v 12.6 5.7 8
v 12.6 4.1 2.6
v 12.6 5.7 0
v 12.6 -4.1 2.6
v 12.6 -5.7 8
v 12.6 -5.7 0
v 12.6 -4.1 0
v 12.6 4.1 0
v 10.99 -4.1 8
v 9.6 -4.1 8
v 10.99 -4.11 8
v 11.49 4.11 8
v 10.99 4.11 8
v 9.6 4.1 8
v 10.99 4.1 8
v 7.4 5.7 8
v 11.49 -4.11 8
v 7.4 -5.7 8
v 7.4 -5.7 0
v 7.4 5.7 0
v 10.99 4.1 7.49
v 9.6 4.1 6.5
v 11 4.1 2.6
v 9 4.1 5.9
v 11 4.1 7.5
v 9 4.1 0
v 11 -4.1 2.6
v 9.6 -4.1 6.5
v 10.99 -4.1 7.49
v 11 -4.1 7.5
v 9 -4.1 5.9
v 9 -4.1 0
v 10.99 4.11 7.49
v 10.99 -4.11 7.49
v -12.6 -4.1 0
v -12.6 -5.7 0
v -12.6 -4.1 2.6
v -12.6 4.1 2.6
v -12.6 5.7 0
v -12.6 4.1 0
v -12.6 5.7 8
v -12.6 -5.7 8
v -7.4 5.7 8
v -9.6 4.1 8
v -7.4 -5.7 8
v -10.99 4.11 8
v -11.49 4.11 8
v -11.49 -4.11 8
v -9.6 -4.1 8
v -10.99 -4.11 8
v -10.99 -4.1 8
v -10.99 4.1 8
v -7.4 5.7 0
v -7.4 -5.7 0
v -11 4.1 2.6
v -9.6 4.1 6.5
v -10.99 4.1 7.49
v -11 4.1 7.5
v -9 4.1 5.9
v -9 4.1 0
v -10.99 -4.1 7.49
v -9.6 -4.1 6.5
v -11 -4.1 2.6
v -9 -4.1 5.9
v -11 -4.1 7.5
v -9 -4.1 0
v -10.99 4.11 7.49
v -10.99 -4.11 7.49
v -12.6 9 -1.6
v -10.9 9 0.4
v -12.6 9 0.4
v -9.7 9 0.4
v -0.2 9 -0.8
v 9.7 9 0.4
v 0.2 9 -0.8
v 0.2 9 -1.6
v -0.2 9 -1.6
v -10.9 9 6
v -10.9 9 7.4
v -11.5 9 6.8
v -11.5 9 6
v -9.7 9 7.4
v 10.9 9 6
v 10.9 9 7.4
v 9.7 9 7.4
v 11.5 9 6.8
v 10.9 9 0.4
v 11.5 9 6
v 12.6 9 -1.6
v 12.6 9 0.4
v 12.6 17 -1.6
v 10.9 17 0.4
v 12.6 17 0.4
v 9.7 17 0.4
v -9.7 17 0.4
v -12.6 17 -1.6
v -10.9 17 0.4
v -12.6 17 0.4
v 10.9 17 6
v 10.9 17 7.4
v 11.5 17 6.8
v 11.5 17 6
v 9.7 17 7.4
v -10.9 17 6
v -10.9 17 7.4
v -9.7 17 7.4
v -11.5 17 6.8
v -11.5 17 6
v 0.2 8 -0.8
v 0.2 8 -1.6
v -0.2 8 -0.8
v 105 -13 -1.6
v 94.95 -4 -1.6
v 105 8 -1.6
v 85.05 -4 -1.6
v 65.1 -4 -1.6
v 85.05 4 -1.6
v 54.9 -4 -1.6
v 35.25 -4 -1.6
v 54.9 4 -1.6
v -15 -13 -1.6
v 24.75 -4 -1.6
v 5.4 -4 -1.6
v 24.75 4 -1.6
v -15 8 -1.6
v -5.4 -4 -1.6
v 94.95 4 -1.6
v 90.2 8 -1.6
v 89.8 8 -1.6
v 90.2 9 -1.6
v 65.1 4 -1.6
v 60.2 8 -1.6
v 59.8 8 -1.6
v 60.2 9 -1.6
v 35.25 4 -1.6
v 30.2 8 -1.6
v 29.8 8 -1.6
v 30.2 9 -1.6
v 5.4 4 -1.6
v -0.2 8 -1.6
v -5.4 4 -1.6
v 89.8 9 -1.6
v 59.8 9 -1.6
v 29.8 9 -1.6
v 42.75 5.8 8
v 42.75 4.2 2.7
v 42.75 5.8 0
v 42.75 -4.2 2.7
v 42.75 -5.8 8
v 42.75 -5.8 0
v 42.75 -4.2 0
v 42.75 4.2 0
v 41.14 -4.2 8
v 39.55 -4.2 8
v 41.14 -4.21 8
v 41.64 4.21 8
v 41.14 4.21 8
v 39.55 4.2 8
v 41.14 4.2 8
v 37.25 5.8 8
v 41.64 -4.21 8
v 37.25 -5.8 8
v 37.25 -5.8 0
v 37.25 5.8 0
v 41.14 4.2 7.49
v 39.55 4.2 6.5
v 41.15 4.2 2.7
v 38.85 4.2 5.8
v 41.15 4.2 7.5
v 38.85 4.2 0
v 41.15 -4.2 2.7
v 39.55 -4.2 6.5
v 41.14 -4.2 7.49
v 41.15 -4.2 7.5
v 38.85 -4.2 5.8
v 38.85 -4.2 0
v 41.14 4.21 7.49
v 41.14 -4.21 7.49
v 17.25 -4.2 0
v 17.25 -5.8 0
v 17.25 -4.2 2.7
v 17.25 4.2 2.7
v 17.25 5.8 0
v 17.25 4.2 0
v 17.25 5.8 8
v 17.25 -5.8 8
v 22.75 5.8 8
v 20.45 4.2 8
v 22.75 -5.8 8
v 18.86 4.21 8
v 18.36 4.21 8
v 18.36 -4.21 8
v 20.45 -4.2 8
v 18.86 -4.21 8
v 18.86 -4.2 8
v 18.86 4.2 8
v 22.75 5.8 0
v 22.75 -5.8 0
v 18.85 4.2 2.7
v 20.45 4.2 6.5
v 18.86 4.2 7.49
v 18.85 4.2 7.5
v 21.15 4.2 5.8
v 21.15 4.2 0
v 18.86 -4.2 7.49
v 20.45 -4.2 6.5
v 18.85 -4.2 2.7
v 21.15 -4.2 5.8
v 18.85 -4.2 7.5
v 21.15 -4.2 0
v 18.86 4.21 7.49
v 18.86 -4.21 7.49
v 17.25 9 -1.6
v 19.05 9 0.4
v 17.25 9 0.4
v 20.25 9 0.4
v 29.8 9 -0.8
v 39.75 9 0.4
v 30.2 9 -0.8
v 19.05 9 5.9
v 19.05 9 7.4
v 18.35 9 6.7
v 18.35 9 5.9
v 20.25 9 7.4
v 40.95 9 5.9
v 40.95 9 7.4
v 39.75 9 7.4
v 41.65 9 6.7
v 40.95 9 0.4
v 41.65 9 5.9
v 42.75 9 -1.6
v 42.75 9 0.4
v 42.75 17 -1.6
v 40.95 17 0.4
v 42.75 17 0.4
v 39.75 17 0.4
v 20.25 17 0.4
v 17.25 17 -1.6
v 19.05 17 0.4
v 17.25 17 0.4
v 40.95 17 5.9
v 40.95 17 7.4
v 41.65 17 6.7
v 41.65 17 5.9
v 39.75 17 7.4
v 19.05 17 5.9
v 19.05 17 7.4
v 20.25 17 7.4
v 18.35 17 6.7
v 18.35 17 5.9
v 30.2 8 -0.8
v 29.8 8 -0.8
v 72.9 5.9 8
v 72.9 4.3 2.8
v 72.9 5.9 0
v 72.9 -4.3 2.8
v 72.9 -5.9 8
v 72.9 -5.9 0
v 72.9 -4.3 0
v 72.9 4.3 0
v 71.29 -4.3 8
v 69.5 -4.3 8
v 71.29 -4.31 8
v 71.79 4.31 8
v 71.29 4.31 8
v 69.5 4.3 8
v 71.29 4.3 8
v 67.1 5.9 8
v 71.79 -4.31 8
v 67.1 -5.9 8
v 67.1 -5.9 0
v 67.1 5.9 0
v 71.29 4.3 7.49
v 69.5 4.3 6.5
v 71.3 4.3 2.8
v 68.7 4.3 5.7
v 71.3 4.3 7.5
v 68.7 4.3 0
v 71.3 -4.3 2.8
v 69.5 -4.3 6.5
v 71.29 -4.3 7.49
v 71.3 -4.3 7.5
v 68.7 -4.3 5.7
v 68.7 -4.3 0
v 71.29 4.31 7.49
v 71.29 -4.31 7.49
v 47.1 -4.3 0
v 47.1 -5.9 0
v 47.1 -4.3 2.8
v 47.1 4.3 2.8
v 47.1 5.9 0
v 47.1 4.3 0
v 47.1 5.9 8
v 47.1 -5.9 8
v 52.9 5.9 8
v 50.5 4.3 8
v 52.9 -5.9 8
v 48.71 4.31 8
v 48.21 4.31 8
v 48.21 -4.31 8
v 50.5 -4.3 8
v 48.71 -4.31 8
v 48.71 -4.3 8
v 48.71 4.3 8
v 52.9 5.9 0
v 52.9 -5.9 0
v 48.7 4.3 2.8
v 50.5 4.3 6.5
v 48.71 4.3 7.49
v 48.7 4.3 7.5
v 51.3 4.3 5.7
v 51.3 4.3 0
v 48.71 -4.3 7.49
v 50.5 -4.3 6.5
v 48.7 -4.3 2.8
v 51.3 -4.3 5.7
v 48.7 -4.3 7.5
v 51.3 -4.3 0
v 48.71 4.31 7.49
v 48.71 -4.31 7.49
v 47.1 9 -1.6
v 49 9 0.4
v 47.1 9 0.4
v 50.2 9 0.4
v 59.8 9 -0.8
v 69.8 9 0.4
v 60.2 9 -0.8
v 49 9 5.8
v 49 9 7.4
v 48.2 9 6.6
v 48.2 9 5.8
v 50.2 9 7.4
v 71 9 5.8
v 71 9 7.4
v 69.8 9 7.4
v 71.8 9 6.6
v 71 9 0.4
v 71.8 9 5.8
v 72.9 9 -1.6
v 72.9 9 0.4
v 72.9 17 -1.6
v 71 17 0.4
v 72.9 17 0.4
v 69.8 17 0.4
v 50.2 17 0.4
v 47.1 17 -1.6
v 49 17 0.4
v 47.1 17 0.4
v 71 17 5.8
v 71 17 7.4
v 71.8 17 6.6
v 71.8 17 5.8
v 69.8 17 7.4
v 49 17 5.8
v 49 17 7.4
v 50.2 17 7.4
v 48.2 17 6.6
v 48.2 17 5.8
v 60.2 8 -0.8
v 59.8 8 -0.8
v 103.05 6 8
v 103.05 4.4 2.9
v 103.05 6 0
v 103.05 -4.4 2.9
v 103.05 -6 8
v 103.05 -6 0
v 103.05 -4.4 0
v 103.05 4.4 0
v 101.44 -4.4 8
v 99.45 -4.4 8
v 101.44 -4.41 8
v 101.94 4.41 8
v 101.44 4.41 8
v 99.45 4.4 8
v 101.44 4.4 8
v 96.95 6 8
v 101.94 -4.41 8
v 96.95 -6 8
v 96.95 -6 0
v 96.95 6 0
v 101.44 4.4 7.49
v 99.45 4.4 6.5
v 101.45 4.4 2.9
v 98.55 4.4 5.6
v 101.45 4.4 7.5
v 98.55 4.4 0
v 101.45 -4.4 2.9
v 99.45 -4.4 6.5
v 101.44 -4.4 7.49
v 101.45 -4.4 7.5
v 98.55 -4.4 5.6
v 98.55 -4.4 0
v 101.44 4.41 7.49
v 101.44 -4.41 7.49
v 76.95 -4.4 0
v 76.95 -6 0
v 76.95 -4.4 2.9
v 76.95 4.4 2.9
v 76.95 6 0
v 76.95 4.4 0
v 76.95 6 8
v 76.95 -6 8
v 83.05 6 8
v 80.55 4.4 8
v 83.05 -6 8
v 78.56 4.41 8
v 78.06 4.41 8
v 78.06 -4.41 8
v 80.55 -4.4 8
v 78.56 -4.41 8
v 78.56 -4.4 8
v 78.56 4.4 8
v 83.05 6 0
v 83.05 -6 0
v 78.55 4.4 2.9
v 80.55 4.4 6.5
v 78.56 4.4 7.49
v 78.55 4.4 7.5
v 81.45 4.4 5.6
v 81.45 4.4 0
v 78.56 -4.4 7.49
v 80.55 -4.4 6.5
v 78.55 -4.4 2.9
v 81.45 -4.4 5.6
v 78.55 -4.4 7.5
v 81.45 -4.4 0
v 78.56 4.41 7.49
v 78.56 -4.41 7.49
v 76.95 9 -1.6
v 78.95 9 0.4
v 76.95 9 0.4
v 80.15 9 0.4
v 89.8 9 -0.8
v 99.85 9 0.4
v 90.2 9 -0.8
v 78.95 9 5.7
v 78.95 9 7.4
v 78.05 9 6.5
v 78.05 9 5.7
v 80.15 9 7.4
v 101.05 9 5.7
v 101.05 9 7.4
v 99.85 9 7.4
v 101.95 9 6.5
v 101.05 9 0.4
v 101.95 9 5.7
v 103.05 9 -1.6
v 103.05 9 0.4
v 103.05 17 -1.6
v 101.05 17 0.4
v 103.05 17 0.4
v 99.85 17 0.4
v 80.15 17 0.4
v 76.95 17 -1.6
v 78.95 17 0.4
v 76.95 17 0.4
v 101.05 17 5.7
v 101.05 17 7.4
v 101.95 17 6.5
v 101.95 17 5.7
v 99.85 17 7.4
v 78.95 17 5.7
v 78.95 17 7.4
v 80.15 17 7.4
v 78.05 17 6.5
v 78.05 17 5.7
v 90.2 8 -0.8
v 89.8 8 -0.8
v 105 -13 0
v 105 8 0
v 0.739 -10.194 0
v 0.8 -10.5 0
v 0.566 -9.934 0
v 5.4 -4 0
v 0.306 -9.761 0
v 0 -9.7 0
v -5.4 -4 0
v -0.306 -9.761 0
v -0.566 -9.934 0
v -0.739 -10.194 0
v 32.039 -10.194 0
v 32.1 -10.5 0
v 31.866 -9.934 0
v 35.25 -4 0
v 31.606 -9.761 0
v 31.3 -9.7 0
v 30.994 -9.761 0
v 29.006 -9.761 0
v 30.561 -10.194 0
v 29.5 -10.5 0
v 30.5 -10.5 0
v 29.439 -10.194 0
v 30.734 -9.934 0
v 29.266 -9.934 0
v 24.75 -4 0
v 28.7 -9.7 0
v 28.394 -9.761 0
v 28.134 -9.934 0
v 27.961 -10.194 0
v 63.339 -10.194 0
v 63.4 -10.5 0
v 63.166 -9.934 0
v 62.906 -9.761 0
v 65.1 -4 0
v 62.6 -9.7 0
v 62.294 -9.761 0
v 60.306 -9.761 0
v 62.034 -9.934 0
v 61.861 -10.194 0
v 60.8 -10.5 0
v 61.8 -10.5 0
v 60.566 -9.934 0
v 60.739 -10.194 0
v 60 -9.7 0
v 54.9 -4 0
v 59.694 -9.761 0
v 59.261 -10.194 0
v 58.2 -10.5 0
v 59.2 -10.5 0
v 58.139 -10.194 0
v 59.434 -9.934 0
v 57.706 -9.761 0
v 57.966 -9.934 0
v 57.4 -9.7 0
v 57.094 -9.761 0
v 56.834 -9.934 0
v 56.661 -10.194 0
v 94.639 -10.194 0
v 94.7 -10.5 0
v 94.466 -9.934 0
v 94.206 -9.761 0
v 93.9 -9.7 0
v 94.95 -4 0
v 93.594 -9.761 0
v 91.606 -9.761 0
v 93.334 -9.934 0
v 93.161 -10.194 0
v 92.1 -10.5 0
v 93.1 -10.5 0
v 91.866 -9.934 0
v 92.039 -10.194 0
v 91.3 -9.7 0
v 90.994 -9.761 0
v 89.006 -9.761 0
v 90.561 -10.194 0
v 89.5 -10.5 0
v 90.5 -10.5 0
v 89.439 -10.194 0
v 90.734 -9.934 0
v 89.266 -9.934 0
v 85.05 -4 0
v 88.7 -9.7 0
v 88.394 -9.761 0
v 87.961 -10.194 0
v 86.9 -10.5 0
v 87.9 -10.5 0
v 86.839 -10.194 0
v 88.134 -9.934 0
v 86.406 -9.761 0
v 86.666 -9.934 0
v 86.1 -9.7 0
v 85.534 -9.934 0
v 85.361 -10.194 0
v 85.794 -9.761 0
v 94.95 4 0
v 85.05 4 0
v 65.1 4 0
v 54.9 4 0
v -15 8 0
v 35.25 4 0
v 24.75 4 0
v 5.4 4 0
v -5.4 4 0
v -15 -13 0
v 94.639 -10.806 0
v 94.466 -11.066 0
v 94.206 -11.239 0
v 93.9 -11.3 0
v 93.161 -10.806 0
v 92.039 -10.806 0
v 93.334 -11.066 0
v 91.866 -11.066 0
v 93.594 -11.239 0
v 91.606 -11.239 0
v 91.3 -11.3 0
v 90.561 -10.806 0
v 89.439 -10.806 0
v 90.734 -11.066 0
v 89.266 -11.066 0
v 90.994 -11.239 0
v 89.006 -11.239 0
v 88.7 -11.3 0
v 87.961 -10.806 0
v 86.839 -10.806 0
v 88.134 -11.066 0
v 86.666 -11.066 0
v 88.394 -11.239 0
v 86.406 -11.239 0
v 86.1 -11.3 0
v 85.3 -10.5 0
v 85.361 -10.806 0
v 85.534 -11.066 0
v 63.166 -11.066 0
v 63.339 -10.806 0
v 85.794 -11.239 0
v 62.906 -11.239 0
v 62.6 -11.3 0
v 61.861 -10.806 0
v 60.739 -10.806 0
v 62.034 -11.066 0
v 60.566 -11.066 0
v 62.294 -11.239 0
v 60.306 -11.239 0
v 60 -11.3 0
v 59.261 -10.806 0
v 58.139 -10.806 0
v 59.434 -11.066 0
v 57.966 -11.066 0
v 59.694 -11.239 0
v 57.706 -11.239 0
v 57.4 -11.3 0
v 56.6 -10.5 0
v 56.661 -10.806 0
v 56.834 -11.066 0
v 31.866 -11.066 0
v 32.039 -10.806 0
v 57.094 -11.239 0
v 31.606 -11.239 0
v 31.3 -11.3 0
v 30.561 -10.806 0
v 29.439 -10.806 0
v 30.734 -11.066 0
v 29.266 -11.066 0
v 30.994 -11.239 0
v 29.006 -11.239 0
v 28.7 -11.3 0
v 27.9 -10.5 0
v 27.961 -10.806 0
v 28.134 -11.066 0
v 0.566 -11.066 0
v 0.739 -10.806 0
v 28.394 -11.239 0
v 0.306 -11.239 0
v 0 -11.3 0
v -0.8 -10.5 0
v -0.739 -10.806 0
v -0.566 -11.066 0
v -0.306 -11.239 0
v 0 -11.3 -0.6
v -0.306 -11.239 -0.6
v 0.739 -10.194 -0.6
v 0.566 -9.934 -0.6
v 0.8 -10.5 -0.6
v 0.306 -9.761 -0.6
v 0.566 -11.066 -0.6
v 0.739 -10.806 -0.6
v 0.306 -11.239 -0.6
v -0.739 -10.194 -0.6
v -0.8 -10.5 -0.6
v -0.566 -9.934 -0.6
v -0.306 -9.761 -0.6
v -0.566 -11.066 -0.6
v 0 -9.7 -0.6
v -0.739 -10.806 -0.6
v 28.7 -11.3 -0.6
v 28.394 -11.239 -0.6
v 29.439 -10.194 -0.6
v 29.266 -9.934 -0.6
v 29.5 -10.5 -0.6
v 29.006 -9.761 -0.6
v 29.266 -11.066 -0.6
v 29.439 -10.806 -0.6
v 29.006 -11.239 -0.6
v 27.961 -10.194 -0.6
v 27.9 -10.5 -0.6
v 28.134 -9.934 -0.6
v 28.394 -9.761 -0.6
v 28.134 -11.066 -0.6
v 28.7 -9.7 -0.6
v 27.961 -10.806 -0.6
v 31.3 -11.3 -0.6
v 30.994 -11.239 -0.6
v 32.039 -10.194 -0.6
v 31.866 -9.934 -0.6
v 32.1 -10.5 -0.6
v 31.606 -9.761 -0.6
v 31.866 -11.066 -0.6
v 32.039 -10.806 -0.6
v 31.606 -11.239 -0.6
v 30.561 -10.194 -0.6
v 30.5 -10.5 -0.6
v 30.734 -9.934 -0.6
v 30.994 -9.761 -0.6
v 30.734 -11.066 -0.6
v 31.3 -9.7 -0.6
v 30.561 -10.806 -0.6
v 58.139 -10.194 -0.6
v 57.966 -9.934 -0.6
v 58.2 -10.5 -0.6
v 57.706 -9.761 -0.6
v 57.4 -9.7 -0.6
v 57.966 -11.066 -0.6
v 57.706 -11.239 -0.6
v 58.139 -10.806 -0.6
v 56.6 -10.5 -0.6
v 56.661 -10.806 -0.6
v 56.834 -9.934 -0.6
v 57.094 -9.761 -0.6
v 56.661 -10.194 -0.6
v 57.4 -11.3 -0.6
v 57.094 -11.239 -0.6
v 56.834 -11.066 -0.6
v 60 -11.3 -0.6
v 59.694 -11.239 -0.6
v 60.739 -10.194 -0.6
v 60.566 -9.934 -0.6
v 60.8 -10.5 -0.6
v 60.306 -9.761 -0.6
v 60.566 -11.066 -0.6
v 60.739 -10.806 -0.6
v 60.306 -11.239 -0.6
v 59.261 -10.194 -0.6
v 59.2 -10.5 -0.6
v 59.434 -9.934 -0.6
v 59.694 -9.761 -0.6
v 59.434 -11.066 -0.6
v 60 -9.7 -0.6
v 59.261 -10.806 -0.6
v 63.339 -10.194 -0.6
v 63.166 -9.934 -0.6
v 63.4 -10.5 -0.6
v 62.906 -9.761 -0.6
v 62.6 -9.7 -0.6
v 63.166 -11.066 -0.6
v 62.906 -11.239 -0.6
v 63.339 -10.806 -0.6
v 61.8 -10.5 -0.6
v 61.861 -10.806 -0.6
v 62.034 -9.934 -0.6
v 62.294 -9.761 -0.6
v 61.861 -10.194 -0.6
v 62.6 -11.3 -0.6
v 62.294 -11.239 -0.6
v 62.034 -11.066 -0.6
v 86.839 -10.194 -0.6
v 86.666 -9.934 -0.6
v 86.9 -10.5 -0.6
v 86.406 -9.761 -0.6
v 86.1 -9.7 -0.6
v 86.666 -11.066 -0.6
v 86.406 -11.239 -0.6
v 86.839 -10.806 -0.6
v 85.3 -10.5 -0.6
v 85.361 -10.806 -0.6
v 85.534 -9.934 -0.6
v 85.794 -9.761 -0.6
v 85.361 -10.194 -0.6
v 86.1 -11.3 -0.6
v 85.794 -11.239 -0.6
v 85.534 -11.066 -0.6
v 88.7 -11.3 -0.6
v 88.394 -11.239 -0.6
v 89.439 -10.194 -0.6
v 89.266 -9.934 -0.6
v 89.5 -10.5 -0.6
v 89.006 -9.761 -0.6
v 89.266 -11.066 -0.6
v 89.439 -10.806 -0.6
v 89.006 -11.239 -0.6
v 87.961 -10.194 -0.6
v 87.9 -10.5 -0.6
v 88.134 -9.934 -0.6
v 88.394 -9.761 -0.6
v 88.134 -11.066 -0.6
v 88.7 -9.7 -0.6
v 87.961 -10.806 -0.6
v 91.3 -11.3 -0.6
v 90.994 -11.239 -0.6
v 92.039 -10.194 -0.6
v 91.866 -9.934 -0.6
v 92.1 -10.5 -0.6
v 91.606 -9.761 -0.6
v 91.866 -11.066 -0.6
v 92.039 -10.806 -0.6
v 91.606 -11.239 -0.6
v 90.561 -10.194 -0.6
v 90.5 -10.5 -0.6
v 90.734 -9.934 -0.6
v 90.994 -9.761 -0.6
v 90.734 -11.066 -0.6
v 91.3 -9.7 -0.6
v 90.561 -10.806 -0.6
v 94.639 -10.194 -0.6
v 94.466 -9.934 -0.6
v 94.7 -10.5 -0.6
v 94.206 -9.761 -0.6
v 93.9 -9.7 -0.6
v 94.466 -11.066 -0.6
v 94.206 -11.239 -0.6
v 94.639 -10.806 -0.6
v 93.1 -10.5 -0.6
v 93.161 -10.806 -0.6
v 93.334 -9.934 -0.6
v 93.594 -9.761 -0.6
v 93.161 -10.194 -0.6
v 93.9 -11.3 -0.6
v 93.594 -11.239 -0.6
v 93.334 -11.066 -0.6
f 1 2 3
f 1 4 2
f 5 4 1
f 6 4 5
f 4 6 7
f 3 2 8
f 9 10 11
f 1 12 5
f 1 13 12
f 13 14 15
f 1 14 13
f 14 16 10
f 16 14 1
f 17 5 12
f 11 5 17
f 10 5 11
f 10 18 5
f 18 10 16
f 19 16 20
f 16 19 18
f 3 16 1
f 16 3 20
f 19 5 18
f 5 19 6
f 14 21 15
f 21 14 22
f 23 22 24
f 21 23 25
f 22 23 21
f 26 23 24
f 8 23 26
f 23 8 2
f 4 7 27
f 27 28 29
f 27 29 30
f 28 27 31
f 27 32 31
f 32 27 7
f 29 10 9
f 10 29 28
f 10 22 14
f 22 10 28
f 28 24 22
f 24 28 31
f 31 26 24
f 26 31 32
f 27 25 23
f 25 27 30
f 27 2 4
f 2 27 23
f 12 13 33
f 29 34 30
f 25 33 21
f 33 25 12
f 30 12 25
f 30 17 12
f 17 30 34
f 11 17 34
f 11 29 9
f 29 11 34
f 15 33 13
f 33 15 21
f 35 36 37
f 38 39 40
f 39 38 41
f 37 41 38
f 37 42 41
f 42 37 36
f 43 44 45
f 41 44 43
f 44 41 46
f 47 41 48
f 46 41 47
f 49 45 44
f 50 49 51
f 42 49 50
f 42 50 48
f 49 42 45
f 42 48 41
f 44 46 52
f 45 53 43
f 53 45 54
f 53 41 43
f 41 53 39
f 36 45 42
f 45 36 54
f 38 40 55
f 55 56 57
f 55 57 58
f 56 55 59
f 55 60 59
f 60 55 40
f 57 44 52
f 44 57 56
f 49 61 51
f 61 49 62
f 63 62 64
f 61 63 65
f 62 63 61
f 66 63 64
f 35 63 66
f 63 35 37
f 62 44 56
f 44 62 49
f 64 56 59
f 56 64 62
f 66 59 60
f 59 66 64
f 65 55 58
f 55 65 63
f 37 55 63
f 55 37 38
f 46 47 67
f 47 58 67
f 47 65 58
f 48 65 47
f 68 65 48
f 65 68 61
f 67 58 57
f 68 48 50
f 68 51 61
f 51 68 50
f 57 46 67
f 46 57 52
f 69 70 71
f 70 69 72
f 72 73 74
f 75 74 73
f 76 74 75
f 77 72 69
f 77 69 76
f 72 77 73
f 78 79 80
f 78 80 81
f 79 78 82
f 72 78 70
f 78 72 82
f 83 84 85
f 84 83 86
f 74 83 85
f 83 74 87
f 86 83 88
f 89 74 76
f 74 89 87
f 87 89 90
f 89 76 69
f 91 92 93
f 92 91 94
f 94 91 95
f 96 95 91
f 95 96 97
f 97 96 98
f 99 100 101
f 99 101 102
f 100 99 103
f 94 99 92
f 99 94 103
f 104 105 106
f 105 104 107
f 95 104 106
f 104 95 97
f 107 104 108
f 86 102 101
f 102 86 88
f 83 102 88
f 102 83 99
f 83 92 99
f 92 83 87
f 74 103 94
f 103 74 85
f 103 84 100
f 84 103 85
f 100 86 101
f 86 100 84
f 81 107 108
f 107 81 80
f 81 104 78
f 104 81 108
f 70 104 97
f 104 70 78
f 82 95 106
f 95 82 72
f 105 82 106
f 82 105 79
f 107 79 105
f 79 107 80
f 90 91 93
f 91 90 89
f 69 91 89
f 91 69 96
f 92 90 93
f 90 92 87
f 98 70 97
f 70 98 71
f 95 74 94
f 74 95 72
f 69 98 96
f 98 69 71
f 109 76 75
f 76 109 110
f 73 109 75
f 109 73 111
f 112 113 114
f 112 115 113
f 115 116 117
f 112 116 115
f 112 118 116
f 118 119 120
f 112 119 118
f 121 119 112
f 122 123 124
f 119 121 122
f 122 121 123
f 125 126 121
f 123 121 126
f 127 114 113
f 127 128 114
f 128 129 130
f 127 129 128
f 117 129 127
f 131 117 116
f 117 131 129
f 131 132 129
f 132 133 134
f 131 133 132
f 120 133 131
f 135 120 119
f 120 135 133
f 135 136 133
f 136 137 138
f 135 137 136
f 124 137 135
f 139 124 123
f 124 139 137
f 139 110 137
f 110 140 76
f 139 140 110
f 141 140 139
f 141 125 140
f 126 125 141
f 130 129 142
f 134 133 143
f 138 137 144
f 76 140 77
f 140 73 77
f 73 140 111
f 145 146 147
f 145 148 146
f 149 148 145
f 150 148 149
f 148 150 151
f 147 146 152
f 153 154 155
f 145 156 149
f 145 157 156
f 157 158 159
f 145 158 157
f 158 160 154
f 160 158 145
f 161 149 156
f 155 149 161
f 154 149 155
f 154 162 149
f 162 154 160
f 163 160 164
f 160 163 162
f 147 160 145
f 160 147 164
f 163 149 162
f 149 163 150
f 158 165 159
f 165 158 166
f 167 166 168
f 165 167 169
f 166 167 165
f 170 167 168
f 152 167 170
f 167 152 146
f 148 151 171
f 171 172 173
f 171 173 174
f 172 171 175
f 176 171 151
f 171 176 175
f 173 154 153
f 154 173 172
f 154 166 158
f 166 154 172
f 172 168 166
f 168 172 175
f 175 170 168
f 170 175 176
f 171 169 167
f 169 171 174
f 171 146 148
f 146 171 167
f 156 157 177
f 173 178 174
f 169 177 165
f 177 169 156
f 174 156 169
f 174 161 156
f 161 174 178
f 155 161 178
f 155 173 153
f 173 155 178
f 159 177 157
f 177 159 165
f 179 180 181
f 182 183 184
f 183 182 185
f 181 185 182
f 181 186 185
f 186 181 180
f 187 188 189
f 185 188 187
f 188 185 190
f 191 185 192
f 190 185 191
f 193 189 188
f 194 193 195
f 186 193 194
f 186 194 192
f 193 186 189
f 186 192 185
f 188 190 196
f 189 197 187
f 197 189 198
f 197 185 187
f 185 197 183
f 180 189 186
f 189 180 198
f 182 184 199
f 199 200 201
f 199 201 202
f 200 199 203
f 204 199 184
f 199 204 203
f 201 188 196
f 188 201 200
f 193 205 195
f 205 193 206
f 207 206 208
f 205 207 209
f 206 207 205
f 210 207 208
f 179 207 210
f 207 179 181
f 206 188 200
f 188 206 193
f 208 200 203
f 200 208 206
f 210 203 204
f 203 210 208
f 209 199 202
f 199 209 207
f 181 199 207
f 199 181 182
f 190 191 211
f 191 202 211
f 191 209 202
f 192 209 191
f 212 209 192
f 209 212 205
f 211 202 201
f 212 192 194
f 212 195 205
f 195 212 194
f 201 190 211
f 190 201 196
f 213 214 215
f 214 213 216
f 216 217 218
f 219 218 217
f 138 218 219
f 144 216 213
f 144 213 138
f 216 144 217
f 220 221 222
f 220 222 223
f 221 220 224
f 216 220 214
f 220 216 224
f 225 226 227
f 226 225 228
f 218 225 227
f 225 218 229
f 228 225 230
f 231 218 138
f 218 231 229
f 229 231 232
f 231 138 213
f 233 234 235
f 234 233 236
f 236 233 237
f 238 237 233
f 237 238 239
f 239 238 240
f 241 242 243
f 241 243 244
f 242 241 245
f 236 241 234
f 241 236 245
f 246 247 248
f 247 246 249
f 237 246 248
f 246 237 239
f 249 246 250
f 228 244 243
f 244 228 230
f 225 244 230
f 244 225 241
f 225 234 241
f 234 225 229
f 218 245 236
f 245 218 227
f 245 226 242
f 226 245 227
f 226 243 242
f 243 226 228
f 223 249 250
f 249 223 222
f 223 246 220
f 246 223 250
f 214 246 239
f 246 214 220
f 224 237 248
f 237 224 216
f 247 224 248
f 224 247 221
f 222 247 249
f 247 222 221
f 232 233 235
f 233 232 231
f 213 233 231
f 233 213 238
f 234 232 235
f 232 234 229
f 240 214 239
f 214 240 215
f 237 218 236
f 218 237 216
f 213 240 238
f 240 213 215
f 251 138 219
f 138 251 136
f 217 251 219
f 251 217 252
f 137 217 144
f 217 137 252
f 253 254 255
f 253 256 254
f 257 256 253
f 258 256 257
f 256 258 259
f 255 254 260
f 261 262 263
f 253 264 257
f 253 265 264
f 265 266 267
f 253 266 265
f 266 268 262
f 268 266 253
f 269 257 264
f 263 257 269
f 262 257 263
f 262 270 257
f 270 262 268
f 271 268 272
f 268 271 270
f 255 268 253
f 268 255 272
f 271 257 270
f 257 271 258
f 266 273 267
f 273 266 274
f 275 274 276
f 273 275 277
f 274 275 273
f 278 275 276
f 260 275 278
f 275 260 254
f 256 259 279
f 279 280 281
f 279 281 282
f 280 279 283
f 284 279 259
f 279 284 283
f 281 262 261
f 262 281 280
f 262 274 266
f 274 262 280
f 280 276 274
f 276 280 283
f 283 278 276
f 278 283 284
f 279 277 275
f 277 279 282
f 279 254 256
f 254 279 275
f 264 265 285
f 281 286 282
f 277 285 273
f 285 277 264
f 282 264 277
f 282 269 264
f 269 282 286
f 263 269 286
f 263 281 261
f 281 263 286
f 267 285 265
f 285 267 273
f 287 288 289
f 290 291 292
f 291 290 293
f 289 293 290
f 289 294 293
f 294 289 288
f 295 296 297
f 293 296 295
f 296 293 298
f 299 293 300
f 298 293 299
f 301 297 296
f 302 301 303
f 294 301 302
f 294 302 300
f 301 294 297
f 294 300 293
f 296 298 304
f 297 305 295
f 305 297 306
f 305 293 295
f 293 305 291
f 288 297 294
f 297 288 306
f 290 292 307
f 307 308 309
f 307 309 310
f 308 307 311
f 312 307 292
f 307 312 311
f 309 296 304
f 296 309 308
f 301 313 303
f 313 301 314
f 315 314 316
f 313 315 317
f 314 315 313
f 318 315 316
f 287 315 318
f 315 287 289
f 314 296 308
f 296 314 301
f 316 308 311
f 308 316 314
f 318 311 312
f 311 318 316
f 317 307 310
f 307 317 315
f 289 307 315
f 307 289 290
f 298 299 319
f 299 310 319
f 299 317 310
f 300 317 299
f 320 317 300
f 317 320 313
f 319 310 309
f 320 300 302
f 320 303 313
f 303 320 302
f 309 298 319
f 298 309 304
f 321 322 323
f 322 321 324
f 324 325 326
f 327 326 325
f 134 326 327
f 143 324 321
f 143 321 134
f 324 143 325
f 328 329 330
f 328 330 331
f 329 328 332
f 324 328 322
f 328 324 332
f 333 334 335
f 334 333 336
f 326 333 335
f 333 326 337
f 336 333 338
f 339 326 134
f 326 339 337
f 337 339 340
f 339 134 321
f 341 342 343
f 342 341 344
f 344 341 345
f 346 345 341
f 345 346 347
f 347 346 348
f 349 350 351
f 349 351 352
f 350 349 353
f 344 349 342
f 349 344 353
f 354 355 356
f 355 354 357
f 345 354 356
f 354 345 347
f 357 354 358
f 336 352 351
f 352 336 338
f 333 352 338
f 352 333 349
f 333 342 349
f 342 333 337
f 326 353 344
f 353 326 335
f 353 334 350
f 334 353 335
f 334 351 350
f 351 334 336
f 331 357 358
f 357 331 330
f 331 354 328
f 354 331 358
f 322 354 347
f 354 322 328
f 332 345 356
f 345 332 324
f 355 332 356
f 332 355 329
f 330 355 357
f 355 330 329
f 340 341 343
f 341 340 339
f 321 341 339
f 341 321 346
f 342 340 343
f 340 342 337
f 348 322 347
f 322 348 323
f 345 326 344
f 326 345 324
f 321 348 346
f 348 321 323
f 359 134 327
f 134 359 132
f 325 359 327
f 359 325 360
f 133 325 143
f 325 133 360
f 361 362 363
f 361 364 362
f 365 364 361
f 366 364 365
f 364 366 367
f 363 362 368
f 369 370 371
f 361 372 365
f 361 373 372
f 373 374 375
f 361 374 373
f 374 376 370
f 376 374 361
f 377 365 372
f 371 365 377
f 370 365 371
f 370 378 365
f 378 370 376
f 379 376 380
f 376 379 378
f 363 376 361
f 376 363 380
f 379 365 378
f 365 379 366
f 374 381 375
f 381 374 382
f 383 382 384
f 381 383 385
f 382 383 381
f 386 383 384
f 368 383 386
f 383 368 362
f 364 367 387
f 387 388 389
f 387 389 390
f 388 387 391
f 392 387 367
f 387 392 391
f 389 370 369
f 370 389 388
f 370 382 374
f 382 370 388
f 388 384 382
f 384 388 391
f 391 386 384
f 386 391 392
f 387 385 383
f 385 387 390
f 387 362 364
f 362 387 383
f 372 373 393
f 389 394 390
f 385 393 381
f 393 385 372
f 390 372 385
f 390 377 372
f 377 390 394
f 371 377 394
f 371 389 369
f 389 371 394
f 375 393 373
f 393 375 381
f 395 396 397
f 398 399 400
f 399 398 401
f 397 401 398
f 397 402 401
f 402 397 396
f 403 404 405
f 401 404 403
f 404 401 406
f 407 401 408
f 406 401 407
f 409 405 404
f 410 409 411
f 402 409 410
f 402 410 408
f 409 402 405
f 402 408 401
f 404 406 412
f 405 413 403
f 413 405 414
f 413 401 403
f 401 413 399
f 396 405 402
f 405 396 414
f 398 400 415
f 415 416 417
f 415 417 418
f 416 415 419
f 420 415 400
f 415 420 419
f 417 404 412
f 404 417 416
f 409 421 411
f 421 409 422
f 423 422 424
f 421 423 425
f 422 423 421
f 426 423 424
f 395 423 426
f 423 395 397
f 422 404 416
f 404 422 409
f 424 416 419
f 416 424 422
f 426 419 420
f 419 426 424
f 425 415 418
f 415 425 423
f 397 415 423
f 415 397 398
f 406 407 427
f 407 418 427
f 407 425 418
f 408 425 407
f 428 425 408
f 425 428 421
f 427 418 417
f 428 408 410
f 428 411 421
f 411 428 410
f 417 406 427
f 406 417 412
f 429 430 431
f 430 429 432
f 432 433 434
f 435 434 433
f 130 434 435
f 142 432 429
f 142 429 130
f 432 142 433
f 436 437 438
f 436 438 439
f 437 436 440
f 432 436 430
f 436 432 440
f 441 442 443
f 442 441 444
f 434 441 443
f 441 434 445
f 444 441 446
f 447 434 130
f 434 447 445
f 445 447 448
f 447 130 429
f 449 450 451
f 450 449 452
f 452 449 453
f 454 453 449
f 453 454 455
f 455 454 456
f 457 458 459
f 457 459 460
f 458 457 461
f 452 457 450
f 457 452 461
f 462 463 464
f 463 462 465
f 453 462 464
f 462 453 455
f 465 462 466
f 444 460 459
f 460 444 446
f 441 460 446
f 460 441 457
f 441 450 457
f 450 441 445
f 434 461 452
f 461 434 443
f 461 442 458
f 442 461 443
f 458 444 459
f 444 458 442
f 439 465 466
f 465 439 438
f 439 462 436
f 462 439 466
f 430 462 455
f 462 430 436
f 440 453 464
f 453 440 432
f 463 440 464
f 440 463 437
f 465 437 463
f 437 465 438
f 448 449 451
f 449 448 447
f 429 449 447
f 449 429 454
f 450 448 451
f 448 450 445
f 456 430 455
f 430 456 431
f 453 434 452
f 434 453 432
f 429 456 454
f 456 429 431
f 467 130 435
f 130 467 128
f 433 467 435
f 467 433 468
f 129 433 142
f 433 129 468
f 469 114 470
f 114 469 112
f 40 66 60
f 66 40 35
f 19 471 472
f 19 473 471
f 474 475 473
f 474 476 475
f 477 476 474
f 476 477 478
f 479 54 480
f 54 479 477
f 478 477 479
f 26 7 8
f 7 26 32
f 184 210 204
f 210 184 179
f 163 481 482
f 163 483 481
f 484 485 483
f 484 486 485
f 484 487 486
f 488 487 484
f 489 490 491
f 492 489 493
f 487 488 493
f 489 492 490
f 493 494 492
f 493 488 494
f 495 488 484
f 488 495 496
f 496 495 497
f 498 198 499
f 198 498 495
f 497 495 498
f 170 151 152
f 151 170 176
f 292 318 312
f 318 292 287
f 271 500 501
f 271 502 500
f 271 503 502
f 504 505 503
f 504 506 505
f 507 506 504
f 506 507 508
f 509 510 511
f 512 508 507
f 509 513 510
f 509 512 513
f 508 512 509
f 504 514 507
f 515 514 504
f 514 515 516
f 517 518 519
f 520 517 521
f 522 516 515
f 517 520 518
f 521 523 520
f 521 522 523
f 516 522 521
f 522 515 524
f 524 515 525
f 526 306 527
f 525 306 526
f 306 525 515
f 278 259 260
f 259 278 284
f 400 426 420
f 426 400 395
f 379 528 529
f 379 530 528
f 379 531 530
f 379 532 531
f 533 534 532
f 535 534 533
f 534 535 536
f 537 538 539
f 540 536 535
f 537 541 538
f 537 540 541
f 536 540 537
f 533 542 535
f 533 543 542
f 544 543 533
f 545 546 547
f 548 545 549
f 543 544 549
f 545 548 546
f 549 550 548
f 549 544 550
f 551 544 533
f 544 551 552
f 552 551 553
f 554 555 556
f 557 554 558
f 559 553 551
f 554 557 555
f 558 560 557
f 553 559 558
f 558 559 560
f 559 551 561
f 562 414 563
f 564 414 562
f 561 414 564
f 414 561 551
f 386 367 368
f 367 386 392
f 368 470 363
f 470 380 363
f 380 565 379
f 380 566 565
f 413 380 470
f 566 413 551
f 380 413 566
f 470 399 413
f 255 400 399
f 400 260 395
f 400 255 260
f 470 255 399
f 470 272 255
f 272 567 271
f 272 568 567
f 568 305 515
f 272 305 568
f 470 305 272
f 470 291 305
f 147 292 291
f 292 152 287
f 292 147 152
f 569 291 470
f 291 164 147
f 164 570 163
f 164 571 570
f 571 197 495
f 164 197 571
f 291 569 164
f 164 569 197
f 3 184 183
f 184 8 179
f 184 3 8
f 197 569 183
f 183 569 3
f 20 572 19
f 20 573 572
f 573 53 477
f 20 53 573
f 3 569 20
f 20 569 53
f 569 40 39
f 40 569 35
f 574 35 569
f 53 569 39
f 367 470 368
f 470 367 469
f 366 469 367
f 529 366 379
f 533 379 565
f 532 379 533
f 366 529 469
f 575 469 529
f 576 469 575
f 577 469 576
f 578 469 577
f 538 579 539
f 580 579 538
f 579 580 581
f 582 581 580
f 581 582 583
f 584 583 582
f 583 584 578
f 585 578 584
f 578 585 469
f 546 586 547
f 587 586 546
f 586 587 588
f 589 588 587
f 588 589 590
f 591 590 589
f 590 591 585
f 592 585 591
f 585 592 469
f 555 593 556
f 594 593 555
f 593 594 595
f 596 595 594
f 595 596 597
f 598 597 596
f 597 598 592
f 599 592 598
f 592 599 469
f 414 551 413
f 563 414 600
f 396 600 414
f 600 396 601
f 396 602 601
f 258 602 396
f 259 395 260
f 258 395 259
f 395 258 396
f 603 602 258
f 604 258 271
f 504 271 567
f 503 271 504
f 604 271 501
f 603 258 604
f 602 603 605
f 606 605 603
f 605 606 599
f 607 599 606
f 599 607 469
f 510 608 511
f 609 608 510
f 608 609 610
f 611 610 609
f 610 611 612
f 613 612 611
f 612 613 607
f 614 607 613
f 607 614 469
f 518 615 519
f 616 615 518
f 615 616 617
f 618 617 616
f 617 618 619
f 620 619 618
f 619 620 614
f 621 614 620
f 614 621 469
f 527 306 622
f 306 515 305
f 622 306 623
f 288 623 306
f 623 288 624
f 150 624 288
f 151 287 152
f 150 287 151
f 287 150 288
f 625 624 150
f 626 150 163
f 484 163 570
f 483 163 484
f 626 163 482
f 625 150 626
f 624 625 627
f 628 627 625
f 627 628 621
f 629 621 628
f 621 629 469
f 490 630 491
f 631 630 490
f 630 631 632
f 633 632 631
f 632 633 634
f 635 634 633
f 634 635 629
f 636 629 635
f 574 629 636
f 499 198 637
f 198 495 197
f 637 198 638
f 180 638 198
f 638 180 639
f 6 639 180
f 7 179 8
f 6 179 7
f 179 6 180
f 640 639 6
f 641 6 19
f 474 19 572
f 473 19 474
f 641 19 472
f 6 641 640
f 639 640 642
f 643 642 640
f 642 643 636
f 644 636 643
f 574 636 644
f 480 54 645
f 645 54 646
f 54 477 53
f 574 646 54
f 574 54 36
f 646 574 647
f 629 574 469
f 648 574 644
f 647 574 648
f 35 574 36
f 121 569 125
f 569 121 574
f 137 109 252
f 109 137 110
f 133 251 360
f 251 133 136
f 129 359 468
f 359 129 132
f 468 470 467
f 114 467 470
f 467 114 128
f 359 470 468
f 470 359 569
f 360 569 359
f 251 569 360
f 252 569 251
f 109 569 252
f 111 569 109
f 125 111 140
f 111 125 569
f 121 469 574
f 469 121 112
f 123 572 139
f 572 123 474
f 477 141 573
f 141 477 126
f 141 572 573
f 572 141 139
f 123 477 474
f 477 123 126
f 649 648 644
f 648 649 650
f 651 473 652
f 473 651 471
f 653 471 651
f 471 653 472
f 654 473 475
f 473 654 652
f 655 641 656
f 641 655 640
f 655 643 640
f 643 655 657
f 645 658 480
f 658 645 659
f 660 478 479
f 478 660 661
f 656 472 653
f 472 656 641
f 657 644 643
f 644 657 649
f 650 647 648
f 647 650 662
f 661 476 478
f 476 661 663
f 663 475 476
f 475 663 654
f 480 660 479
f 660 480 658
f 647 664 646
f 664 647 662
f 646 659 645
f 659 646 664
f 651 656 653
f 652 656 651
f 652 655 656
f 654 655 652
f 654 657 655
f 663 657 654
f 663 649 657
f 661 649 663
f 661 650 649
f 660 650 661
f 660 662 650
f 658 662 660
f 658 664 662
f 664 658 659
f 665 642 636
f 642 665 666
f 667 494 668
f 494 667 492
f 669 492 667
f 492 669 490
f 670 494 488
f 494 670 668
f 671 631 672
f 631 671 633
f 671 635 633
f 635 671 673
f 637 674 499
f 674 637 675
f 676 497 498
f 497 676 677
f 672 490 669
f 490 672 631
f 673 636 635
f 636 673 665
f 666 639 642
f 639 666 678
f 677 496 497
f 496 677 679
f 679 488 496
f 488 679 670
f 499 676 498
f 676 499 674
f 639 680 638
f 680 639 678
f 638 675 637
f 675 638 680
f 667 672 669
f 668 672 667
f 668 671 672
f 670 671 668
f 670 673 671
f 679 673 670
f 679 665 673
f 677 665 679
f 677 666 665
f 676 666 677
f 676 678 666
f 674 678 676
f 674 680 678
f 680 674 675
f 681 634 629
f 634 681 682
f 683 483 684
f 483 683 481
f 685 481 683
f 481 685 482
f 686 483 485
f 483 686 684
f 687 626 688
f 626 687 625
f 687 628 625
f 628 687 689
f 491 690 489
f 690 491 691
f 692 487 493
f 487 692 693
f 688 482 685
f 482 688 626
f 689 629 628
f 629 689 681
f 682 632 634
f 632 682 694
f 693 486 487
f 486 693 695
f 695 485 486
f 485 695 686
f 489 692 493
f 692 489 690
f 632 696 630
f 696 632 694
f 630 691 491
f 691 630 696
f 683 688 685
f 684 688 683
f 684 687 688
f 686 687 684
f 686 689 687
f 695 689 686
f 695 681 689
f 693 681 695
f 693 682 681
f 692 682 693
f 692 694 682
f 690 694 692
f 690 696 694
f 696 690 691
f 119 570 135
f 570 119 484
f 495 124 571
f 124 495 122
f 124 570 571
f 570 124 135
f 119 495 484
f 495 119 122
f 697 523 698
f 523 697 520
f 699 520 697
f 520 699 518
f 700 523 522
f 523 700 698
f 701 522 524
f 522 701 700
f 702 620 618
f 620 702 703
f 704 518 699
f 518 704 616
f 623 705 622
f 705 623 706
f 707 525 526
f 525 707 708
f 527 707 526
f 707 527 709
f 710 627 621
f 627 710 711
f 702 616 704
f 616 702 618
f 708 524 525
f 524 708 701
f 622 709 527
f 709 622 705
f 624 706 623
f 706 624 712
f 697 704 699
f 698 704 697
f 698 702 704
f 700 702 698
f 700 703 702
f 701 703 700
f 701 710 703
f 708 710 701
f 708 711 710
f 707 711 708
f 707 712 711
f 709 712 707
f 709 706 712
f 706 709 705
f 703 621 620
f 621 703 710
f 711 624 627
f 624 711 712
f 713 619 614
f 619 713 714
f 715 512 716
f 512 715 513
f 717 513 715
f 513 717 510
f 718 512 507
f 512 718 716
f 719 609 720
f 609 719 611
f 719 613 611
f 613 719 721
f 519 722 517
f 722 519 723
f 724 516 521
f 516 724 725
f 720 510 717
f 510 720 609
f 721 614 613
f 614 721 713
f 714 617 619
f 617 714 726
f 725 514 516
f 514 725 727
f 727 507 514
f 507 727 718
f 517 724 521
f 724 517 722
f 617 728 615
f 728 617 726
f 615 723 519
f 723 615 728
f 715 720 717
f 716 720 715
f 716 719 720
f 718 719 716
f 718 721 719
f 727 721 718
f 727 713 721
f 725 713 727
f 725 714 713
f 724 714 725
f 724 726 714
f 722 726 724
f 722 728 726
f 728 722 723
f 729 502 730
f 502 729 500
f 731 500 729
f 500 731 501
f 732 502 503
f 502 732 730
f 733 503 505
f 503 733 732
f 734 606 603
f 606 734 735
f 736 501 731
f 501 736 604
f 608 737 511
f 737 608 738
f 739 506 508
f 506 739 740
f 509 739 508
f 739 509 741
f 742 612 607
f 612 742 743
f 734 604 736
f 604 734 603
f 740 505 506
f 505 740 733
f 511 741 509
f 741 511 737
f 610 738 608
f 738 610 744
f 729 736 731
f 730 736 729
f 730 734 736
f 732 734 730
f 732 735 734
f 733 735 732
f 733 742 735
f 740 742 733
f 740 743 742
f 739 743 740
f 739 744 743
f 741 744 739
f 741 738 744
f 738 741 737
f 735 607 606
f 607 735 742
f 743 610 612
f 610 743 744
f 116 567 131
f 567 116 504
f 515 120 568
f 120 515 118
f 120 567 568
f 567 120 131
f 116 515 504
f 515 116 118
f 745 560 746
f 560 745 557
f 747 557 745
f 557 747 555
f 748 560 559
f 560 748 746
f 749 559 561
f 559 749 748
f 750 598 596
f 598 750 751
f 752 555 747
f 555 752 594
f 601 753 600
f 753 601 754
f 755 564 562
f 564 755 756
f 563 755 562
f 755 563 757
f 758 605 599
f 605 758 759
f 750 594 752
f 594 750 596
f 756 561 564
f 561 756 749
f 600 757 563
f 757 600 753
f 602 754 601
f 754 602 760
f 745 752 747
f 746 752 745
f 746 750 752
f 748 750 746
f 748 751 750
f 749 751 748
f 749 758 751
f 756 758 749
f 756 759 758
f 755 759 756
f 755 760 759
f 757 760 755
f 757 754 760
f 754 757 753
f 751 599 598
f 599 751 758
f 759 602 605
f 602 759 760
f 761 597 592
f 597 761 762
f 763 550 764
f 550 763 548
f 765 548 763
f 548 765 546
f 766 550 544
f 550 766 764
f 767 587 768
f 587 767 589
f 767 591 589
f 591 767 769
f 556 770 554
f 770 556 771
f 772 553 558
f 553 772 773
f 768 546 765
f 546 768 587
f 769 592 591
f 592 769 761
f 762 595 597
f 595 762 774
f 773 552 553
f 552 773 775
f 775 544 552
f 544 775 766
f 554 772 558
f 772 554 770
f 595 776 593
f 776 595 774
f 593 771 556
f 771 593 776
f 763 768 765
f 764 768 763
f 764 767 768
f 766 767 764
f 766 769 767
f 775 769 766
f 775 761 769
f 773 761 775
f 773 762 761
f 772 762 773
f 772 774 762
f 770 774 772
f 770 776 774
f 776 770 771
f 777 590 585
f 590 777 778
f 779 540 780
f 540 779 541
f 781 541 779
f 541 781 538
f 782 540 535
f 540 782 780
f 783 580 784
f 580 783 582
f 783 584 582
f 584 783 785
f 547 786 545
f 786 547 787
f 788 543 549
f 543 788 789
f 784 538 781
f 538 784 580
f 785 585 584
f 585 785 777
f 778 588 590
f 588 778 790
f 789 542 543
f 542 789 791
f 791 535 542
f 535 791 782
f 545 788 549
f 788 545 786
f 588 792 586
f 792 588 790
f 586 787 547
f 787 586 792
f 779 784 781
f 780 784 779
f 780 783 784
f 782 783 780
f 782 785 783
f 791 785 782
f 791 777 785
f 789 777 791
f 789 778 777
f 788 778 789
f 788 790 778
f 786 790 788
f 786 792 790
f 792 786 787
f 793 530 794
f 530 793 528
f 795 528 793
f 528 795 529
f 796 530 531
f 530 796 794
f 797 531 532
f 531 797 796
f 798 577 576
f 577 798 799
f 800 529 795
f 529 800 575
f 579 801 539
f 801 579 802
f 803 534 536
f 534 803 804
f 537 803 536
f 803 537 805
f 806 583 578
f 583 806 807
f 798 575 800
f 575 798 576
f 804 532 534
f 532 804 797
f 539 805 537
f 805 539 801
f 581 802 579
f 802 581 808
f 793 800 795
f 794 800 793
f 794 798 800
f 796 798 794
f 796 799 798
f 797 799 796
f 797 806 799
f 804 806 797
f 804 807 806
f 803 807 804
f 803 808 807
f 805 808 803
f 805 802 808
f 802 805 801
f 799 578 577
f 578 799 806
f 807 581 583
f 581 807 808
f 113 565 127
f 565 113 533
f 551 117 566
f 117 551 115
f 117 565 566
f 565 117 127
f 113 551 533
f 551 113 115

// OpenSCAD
// file: ../../util/marks.scad
//-----------------------------------------------------------------------
// Marks for fit pieces: n dots in a row, engraved into a face, so each
// variant can be told apart after printing. Origin: centre of the row, on
// the face; the dots cut down into -Z. Units: mm.
//-----------------------------------------------------------------------

markDotDia   = 1.6;
markDotPitch = 2.6;
markDotDepth = 0.6;

module markDots(n)
{
  for (i = [0 : n - 1])
    translate([(i - (n - 1)/2)*markDotPitch, 0, -markDotDepth])
      cylinder(d = markDotDia, h = markDotDepth + 1, $fn = 16);
}
// main file
//-----------------------------------------------------------------------
// Fit piece: four pairs of posts on one strip, marked 1 to 4 dots, each
// with its own bar printed beside it on its back, feet up. The bar is
// joined to the strip by a 0.4 x 0.8 breakaway sprue, so the piece is one
// part until you twist the bars off. Snap each bar down into its posts,
// then press a barb in with a thumbnail and lift it out again.
//
//   1  foot clearance 0.1
//   2  foot clearance 0.2
//   3  foot clearance 0.3
//   4  foot clearance 0.4
//
// Barb 0.5 throughout; span 20, bar 8 above the strip (a 602530 pack under
// 3 foam squashed by 1). Prints base down, as exported, no supports.
// Units: mm.
//-----------------------------------------------------------------------

use <bridge.scad>
use <../../util/marks.scad>

span      = 20;
h         = 8;         // brBarZ(6.0)
width     = 8;
baseThick = 1.6;
pitch     = 30;        // the longest bar is 26.1
rim       = 2;         // strip past the posts
markRoom  = 5;         // strip past the posts on the -Y side, for the dots
barGap    = 1.0;       // strip edge to the bar: the sprue's length
sprue     = [0.4, 0.8];   // sprue section: X width, Z height, from the bed up

stations  = [0.1, 0.2, 0.3, 0.4];   // foot clearance

n     = len(stations);
pyMax = max([for (c = stations) brPostY(width, c)]);
y0    = -pyMax/2 - rim - markRoom;  // strip's -Y edge
y1    =  pyMax/2 + rim;             // strip's +Y edge; the bars lie beyond it
barY  = y1 + barGap + width/2;      // bar centre line

difference()
{
  union()
  {
    translate([-pitch/2, y0, -baseThick]) cube([n*pitch, y1 - y0, baseThick]);
    for (i = [0 : n - 1])
      translate([i*pitch, 0, 0])
      {
        bridgePosts(span, h, width, clearance = stations[i]);
        //-- its bar, on its back on the bed: top face down, feet up
        translate([0, barY, h + 2.0 - baseThick]) rotate([180, 0, 0])
          bridgeBar(span, h, width, clearance = stations[i]);
        //-- the sprue, strip edge to the bar's side
        translate([-sprue[0]/2, y1 - 0.01, -baseThick]) cube([sprue[0], barGap + 0.02, sprue[1]]);
      }
  }
  for (i = [0 : n - 1])
    translate([i*pitch, 0, 0])
    {
      //-- open floor between the posts
      ix = brInside(span, stations[i])/2 - rim;
      translate([-ix, -width/2, -baseThick - 1]) cube([2*ix, width, baseThick + 2]);
      translate([0, y0 + markRoom/2, 0]) markDots(i + 1);
    }
}
